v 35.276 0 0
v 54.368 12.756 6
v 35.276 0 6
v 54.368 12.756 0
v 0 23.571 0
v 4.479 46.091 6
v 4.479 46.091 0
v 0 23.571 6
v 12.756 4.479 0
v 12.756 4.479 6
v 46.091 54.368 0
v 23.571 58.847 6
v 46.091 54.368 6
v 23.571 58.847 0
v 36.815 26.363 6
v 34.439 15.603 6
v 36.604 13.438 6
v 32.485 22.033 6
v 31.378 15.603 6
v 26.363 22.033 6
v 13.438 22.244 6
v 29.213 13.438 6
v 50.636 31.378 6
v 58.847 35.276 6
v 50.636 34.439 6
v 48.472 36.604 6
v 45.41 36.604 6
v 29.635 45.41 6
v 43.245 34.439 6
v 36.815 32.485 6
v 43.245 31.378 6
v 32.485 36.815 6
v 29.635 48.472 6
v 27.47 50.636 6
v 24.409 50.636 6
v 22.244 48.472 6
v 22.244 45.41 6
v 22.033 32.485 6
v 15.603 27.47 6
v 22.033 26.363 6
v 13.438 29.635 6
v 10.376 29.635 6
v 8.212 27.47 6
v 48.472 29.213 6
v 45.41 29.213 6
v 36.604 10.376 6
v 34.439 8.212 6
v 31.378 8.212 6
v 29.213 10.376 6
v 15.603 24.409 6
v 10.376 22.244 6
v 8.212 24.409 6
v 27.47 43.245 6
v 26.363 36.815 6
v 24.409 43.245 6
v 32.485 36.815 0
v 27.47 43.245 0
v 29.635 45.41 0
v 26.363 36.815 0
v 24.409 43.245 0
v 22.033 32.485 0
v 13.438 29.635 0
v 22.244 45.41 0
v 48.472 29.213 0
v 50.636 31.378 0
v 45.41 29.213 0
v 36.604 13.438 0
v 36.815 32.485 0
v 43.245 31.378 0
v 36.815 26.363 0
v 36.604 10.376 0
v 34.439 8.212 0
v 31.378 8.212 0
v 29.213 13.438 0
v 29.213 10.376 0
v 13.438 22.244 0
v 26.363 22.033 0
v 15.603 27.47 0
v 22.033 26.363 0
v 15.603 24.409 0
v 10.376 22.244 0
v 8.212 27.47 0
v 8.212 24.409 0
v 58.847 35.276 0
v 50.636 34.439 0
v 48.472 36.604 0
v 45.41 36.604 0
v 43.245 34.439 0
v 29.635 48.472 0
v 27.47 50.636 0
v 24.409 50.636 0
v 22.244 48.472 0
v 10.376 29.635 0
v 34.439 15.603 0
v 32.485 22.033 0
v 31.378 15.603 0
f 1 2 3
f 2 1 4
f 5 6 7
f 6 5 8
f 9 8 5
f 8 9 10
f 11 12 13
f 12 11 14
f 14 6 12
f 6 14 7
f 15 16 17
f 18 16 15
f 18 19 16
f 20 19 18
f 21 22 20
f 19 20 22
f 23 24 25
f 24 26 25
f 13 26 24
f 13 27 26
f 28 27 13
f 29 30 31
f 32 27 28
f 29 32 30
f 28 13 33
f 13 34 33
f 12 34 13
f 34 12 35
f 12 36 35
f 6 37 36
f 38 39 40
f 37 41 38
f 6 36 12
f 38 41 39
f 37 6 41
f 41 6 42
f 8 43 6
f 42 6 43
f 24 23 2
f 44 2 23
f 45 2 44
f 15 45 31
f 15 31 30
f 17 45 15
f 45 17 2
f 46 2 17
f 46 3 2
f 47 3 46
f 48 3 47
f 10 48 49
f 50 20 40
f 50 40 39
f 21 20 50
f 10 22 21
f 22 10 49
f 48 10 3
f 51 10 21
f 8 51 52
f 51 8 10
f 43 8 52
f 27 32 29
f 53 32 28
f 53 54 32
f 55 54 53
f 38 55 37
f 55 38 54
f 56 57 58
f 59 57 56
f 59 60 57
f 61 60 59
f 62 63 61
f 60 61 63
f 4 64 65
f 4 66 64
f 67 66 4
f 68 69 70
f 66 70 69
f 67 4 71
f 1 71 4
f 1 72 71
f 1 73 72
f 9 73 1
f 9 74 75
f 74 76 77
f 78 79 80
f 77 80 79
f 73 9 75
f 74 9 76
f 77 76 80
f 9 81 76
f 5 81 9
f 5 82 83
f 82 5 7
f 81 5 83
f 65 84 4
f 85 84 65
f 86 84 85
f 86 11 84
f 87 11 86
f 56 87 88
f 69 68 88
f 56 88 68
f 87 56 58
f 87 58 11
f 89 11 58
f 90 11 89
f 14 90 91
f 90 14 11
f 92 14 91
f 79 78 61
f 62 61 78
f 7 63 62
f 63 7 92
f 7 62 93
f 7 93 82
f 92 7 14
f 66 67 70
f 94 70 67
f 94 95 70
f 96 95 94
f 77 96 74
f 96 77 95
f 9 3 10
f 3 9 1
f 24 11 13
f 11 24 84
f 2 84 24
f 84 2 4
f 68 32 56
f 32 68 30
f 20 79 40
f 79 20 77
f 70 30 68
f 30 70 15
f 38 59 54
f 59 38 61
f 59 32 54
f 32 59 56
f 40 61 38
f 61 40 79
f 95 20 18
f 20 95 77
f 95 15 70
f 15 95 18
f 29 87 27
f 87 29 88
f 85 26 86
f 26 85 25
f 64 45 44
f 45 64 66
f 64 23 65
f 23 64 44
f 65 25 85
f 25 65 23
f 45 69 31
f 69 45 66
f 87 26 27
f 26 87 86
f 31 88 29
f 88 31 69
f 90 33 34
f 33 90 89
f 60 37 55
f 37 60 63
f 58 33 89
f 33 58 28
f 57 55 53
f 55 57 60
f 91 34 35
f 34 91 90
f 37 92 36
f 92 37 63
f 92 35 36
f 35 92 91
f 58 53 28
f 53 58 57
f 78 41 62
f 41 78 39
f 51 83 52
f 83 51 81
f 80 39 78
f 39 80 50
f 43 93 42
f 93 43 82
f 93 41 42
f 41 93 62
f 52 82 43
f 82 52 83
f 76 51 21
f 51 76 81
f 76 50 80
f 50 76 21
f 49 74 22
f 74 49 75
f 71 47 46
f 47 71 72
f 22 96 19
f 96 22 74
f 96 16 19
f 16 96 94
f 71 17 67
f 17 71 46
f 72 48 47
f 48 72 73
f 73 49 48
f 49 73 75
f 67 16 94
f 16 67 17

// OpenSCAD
$fn = 32;

// ----------------------------------------------------------------------
// Polygon plate: 8-gon R30, 4 bolt windows
// ----------------------------------------------------------------------

// --- parameters (mm) ---
sides = 8;                // number of polygon sides
plate_r = 30;             // circumscribed radius of the polygon
bore_r = 8;               // centre bore radius
bolts = 4;                // number of bolt windows
ring_r = 17.86;           // bolt-circle radius
bolt_r = 4;               // bolt window radius
plate_t = 6;              // plate thickness, Z (extrusion height)

plate_d = 2 * plate_r;  // circumscribed diameter
bore_d = 2 * bore_r;  // centre bore diameter
bolt_d = 2 * bolt_r;  // bolt window diameter
ring_d = 2 * ring_r;  // bolt-circle diameter

profile = [[58.847, 35.276], [46.091, 54.368], [23.571, 58.847], [4.479, 46.091], [0, 23.571], [12.756, 4.479], [35.276, 0], [54.368, 12.756]];  // primary outline, 8 points, counter clockwise
void_1 = [[36.815, 32.485], [32.485, 36.815], [26.363, 36.815], [22.033, 32.485], [22.033, 26.363], [26.363, 22.033], [32.485, 22.033], [36.815, 26.363]];  // centre bore, 8 points
void_2 = [[50.636, 34.439], [48.472, 36.604], [45.41, 36.604], [43.245, 34.439], [43.245, 31.378], [45.41, 29.213], [48.472, 29.213], [50.636, 31.378]];  // bolt window 1, 8 points
void_3 = [[29.635, 48.472], [27.47, 50.636], [24.409, 50.636], [22.244, 48.472], [22.244, 45.41], [24.409, 43.245], [27.47, 43.245], [29.635, 45.41]];  // bolt window 2, 8 points
void_4 = [[15.603, 27.47], [13.438, 29.635], [10.376, 29.635], [8.212, 27.47], [8.212, 24.409], [10.376, 22.244], [13.438, 22.244], [15.603, 24.409]];  // bolt window 3, 8 points
void_5 = [[36.604, 13.438], [34.439, 15.603], [31.378, 15.603], [29.213, 13.438], [29.213, 10.376], [31.378, 8.212], [34.439, 8.212], [36.604, 10.376]];  // bolt window 4, 8 points

// --- the one profile operation ---
difference() {
  linear_extrude(height = plate_t) polygon(points = profile);
  translate([0, 0, -1])
    linear_extrude(height = plate_t + 2) polygon(points = void_1);
  translate([0, 0, -1])
    linear_extrude(height = plate_t + 2) polygon(points = void_2);
  translate([0, 0, -1])
    linear_extrude(height = plate_t + 2) polygon(points = void_3);
  translate([0, 0, -1])
    linear_extrude(height = plate_t + 2) polygon(points = void_4);
  translate([0, 0, -1])
    linear_extrude(height = plate_t + 2) polygon(points = void_5);
}
